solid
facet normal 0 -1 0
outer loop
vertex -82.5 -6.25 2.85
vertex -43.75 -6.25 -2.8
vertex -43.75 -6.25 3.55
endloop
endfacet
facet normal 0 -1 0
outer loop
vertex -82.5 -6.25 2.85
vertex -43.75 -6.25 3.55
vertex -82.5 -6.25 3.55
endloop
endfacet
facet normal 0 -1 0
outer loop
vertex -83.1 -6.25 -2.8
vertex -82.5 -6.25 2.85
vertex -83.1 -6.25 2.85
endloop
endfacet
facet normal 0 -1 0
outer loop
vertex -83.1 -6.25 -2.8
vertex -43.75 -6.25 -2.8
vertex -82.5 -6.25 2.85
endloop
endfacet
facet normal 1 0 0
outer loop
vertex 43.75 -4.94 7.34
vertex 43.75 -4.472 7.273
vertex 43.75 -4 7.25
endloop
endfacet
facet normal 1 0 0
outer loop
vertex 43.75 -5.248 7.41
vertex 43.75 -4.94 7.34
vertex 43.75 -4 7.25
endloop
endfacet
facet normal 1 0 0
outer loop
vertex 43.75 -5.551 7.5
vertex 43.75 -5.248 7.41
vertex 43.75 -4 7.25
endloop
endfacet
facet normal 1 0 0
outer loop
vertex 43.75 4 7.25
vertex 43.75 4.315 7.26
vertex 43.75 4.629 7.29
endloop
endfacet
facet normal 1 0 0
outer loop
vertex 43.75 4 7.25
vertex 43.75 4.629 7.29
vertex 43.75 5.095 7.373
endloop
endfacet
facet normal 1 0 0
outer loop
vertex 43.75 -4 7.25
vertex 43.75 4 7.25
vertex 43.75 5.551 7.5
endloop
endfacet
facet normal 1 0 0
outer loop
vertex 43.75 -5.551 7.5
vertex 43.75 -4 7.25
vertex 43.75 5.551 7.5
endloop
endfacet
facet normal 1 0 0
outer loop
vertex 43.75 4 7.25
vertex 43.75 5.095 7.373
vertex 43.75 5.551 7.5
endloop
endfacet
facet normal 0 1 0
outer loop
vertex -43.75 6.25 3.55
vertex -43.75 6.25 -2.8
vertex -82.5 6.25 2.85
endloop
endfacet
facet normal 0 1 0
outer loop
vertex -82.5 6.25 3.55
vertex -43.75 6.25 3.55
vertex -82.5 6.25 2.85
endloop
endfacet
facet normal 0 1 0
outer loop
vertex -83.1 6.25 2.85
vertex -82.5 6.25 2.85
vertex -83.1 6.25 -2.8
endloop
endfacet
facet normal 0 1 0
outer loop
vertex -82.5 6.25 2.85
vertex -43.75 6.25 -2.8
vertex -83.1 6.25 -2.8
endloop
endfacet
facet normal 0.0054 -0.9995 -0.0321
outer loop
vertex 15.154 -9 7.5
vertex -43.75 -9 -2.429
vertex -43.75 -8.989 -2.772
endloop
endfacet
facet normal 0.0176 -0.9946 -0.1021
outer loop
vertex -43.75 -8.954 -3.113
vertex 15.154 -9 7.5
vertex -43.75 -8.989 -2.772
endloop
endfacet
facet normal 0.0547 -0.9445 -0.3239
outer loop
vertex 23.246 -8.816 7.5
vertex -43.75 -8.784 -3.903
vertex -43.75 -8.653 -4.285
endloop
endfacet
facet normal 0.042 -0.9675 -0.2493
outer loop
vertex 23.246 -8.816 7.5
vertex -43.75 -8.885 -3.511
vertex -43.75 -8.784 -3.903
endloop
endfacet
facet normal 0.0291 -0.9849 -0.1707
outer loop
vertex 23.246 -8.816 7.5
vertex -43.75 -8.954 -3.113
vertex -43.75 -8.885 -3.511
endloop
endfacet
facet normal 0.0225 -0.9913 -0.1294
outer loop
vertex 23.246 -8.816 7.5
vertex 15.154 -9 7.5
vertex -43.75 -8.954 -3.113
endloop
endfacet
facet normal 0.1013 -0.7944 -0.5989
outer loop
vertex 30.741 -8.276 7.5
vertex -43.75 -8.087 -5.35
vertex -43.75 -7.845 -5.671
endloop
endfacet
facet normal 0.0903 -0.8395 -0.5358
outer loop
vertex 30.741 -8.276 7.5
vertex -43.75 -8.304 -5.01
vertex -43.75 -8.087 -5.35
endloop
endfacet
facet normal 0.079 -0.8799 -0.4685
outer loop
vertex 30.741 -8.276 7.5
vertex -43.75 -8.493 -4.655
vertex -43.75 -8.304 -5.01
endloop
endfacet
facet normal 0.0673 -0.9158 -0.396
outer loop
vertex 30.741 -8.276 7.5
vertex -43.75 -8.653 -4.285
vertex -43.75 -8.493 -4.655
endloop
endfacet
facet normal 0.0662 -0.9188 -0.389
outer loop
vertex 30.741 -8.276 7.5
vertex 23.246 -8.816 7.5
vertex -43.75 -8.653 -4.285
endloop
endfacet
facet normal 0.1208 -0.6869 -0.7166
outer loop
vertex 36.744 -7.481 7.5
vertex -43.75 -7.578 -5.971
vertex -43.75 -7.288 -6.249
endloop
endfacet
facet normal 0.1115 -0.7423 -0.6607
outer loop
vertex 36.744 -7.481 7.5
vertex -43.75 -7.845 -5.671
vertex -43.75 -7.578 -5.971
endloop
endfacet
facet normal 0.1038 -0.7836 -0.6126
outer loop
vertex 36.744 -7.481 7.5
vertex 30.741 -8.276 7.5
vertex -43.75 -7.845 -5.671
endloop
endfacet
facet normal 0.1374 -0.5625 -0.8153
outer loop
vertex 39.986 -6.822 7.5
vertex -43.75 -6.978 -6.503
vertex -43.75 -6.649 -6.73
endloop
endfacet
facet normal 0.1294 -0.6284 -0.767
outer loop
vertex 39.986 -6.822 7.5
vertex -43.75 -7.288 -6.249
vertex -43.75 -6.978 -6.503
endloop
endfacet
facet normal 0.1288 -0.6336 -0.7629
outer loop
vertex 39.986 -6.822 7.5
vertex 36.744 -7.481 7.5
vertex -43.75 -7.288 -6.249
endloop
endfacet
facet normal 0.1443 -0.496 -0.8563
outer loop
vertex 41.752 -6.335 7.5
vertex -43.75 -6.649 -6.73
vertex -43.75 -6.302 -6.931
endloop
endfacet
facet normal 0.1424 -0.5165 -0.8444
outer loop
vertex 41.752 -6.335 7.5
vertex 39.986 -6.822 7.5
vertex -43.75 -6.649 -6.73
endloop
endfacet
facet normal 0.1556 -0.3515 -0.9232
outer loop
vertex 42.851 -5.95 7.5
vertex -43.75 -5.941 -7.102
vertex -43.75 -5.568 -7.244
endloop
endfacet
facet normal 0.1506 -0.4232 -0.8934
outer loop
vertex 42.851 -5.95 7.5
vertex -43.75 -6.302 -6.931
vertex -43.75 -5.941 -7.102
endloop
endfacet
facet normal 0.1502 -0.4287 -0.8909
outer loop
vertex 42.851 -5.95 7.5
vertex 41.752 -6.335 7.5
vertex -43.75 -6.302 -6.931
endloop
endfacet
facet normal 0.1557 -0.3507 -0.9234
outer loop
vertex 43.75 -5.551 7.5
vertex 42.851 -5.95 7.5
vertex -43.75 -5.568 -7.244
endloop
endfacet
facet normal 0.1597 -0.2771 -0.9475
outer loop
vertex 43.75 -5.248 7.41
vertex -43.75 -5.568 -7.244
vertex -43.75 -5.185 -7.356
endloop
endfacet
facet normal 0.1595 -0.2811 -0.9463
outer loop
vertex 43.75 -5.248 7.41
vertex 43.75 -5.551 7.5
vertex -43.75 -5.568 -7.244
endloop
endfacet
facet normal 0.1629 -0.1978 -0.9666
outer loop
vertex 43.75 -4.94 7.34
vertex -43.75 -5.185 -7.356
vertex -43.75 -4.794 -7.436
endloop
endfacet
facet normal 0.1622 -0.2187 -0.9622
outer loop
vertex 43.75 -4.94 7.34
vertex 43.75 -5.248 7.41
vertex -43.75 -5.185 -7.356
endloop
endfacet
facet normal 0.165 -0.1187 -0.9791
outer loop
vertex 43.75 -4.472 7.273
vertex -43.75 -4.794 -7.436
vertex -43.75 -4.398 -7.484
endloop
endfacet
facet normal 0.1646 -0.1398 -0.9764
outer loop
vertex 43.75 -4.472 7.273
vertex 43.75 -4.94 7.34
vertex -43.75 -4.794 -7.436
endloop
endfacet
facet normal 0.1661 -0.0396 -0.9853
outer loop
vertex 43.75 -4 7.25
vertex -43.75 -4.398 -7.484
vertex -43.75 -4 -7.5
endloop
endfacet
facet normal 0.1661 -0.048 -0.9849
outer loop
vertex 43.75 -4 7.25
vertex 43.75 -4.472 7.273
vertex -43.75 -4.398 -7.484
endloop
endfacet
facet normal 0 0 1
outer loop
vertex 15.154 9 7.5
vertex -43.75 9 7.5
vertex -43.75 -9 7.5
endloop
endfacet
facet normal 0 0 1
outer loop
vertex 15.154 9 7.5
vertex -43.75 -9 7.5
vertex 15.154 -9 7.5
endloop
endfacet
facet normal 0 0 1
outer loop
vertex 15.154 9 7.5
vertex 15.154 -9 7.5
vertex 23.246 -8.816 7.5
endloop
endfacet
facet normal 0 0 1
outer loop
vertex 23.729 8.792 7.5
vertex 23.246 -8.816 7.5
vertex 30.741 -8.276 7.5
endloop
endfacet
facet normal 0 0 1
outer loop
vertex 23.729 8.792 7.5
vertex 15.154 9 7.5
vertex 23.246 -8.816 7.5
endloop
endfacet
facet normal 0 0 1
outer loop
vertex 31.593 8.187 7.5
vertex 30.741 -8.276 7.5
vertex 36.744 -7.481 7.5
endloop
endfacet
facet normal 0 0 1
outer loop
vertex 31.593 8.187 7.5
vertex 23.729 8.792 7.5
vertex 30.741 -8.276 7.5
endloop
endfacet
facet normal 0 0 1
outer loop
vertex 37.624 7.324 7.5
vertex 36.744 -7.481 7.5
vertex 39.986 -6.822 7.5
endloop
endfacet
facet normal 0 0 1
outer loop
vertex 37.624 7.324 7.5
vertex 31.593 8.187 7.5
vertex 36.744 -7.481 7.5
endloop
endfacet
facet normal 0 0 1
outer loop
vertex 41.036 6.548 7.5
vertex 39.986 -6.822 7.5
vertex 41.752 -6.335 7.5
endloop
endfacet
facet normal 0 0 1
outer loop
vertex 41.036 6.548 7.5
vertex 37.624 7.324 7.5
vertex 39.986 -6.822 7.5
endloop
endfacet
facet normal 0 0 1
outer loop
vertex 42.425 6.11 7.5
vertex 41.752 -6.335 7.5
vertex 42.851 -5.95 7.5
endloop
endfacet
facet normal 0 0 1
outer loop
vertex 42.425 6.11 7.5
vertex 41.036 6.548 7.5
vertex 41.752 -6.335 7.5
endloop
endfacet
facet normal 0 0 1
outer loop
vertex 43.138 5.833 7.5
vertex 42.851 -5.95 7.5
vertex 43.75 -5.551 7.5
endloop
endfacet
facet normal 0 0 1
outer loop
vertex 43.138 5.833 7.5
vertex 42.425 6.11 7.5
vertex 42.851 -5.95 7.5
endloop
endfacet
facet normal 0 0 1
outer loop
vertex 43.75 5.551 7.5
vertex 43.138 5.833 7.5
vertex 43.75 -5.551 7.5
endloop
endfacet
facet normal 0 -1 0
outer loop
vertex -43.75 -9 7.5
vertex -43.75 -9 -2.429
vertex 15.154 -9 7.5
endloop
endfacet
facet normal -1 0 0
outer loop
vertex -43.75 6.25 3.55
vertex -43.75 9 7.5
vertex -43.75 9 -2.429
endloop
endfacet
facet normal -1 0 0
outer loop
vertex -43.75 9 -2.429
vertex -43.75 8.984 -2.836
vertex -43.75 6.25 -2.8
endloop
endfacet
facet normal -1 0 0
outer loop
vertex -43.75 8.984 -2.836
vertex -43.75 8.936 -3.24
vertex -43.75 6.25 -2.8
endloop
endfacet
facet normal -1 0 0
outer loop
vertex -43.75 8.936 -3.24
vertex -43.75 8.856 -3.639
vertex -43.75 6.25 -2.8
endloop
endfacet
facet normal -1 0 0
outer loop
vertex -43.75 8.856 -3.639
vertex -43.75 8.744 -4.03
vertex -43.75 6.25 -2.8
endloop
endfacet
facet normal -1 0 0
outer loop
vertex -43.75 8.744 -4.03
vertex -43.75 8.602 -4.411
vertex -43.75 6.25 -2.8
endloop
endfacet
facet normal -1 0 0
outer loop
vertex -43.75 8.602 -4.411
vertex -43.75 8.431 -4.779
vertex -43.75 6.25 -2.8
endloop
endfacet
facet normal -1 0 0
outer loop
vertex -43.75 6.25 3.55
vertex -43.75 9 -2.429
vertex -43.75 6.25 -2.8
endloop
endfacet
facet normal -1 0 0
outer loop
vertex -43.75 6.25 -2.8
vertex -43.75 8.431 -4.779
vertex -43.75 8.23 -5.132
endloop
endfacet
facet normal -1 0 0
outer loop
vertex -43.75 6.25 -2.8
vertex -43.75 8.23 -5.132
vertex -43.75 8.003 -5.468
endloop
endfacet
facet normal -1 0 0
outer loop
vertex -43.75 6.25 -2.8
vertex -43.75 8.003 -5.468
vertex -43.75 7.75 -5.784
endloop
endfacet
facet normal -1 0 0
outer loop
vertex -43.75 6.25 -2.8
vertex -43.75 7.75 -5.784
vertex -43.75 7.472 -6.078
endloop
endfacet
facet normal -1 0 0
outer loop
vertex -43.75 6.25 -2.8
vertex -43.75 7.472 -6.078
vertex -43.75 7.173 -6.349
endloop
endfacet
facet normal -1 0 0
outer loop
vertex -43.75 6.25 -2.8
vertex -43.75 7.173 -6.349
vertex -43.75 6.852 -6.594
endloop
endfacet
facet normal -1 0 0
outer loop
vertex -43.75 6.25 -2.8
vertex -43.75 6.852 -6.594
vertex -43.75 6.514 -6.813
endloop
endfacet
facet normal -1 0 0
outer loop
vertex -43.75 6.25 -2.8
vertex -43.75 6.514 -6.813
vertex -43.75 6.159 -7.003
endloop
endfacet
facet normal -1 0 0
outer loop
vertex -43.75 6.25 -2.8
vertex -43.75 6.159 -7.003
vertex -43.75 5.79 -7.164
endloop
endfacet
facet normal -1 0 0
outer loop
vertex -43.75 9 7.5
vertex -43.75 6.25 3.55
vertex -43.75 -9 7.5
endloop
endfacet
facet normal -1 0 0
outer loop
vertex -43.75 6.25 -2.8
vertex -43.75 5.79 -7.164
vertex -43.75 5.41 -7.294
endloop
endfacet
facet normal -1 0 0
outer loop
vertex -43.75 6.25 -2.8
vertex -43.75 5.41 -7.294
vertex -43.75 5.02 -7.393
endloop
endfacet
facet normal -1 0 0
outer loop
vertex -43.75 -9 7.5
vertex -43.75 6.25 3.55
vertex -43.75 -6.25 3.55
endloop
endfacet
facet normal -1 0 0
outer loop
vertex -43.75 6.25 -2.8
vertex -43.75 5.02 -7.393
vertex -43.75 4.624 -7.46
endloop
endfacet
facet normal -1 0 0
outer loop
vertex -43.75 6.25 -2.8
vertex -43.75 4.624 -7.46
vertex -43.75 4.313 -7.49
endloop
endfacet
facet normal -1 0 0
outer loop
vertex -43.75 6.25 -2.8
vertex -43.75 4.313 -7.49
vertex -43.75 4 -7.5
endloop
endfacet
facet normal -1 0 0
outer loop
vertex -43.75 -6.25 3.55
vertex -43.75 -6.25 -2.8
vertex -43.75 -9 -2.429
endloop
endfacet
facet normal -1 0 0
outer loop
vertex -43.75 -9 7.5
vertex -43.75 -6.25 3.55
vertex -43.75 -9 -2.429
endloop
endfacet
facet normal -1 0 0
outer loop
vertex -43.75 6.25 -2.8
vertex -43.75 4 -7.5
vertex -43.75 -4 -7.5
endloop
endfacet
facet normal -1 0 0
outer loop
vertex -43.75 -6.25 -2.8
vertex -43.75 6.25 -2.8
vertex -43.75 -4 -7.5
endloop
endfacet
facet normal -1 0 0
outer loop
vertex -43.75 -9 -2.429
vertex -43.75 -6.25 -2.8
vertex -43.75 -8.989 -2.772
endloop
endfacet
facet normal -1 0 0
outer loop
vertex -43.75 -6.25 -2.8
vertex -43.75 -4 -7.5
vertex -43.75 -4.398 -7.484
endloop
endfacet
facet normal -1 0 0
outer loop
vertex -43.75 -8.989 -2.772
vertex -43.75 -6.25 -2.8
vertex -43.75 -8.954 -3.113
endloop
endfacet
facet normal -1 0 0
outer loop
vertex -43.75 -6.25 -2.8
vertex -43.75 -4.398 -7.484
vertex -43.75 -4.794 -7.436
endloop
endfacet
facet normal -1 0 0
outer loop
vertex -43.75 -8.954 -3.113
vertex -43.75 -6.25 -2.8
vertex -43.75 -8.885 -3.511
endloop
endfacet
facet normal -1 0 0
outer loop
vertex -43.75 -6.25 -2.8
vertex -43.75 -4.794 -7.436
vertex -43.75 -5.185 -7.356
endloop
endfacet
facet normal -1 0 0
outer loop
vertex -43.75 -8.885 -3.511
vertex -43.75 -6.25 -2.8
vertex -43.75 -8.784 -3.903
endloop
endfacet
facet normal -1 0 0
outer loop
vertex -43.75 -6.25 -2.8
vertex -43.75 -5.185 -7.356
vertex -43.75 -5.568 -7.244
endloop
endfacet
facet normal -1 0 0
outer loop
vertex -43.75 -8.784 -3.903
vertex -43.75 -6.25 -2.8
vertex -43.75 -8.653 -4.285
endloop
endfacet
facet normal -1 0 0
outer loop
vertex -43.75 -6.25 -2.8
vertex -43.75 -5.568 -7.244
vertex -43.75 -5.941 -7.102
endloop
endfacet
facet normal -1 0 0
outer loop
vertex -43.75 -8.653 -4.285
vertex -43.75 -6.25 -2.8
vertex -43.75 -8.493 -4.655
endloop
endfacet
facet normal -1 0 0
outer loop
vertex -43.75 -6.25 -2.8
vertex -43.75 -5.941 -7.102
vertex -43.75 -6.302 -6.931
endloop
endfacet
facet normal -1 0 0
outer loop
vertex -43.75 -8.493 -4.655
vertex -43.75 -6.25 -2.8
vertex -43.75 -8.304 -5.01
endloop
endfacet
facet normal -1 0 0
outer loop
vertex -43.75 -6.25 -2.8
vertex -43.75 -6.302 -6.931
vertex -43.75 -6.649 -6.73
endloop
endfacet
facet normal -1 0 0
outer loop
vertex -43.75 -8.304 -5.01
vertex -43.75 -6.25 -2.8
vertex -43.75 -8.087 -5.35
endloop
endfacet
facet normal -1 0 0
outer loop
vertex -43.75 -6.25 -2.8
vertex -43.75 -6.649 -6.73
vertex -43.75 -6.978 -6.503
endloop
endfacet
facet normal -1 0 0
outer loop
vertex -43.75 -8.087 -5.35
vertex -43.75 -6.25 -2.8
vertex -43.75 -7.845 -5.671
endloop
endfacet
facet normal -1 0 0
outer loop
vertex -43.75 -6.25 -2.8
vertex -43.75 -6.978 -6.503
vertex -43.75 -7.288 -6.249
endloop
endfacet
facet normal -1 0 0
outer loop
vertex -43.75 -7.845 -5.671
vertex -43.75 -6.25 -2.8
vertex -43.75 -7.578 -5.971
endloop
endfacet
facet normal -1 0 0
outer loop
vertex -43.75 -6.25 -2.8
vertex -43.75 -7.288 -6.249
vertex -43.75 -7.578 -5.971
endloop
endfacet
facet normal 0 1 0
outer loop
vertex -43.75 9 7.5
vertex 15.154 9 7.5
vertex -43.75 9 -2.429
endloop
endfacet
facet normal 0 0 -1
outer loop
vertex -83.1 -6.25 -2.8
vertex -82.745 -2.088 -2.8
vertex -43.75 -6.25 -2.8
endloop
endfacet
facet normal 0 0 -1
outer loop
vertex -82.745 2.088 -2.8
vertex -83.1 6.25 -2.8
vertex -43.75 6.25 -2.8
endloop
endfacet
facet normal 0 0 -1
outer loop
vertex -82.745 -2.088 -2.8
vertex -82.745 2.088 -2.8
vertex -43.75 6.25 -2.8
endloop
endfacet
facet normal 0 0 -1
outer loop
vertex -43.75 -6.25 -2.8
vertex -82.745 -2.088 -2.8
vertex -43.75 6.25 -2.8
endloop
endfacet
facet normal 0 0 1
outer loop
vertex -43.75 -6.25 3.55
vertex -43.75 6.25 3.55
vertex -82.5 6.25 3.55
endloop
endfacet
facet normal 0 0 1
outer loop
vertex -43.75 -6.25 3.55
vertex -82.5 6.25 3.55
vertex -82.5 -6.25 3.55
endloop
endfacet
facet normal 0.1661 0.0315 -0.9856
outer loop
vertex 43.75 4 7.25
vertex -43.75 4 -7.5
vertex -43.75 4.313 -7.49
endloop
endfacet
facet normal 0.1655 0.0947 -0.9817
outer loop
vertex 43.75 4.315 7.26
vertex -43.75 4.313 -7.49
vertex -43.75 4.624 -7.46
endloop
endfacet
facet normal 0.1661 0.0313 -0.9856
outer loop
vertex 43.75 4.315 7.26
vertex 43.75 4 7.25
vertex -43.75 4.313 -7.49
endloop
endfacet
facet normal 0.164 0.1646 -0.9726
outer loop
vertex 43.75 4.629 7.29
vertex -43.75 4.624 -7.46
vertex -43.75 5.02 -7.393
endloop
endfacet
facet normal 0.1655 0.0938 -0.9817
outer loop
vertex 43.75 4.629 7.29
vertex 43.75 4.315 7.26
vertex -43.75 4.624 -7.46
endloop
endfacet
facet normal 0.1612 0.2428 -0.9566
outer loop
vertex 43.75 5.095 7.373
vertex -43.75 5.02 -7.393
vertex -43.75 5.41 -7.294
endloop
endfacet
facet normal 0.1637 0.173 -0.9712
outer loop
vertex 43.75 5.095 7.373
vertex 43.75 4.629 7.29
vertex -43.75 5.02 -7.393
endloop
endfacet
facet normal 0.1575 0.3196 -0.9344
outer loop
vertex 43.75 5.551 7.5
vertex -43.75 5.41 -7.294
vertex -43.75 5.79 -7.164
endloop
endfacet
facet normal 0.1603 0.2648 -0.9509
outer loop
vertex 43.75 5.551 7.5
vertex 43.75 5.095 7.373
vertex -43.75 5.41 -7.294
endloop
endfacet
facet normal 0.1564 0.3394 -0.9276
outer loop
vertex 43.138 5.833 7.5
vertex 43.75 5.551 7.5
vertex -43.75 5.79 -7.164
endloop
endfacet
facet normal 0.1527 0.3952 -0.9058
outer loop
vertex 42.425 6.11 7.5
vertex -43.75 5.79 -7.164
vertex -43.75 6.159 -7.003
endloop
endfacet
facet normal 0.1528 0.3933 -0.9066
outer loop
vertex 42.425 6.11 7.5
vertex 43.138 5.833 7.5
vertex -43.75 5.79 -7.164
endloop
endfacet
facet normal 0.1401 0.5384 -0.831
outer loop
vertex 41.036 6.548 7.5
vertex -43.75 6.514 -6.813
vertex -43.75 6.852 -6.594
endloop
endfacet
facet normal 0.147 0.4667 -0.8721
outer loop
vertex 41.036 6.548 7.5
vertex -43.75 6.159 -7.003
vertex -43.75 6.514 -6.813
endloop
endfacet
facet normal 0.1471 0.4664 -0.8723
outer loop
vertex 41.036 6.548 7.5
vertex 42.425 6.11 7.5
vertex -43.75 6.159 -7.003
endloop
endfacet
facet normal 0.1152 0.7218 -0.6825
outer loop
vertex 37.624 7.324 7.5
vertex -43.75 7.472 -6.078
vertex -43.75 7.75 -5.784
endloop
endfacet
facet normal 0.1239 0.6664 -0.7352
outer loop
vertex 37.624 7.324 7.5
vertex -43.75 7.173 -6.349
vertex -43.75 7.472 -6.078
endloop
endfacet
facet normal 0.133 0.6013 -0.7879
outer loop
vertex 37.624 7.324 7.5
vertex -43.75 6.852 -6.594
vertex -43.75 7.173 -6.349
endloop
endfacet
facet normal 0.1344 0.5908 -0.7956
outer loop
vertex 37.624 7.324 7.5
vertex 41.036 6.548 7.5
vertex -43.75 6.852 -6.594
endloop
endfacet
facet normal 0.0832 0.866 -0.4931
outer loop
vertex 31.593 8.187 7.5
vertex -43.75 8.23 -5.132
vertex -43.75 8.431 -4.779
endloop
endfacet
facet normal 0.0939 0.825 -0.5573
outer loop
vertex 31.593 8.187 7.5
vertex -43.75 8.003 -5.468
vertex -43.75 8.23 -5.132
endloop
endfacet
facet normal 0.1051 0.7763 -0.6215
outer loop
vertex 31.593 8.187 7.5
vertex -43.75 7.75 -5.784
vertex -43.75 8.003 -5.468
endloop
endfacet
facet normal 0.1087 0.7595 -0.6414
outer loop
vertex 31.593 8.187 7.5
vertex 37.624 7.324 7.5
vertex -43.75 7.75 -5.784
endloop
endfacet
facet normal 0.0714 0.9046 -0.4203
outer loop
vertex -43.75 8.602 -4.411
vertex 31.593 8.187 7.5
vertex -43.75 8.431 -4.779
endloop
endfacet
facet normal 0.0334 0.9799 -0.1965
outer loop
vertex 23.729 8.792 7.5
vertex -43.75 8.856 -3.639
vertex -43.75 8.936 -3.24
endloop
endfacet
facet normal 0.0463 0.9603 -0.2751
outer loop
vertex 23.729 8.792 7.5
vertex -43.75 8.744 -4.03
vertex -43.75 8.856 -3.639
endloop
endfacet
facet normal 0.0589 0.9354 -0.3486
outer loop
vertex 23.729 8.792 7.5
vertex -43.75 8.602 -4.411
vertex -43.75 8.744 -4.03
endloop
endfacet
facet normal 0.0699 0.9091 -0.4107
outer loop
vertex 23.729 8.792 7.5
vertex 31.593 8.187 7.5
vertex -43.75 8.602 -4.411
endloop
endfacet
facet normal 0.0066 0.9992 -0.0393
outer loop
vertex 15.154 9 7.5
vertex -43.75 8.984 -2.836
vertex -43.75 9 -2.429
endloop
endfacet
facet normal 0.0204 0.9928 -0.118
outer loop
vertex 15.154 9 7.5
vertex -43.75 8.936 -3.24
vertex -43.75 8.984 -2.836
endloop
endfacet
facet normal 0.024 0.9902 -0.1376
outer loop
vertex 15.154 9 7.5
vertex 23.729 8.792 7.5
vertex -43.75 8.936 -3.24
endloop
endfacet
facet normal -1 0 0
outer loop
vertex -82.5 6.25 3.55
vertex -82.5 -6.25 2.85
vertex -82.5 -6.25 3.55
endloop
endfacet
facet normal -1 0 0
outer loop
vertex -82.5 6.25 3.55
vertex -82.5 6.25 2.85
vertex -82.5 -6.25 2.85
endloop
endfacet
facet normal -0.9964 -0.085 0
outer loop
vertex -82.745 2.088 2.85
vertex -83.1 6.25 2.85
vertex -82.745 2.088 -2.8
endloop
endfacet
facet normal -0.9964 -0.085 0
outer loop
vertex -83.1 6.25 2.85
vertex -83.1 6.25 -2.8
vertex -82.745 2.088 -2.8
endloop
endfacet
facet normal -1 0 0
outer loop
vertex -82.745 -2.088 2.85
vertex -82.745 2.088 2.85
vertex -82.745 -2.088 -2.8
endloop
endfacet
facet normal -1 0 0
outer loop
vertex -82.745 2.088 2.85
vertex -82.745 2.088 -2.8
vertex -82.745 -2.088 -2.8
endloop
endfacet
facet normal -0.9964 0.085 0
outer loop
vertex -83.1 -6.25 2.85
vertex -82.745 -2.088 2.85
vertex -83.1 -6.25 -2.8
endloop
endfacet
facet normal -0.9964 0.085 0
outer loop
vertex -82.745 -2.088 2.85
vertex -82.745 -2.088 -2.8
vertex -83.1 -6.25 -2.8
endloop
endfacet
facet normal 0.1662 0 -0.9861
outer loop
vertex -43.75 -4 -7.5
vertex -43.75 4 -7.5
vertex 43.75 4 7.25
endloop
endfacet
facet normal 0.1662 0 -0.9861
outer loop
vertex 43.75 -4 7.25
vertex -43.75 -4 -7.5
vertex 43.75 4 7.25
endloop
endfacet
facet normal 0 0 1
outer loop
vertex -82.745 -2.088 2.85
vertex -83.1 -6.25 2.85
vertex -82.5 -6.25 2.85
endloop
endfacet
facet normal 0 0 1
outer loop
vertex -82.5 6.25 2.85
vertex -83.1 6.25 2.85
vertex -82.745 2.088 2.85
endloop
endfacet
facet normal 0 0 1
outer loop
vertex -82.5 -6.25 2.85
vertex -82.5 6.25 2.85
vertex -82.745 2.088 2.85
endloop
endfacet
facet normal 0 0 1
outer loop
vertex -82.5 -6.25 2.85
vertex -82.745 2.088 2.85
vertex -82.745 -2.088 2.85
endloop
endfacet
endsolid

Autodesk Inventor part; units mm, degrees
sketch "Sketch1" plane through (0, 0, 0) normal (0, 0, 1) x (1, 0, 0)
  line L0 (-43.75, -9) -> (43.75, -9)
  line L1 (43.75, -9) -> (43.75, 9)
  line L2 (43.75, 9) -> (-43.75, 9)
  line L3 (-43.75, 9) -> (-43.75, -9)
  line L4 (-43.75, -9) -> (43.75, 9) construction
  line L5 (43.75, -9) -> (-43.75, 9) construction
  point P0 (0, 0)
  dimension "d0" = 87.5
  dimension "d1" = 18
extrude "Extrusion1" add sketch "Sketch1" along normal mid plane 15
sketch "Sketch3" plane through (-43.75, 9, 7.5) normal (0, 1, 0) x (1, 0, 0)
  line L0 (0, 15) -> (87.5, 0.25)
  line L1 (87.5, 15) -> (87.5, 0) construction
  line L2 (87.5, 0.25) -> (87.5, 15)
  line L3 (87.5, 15) -> (0, 15)
  point P0 (43.75, 7.5)
  point P1 (87.5, 7.625)
  dimension "d5" = 0.25
extrude "Extrusion2" cut sketch "Sketch3" along normal through all both and the other way through all
sketch "Sketch5" plane through (-43.75, -9, 7.5) normal (-1, 0, 0) x (0, 0, 1)
  line L0 (-3.95, 2.75) -> (-10.3, 2.75)
  line L1 (-10.3, 2.75) -> (-10.3, 15.25)
  line L2 (-10.3, 15.25) -> (-3.95, 15.25)
  line L3 (-3.95, 15.25) -> (-3.95, 2.75)
  line L4 (-3.95, 2.75) -> (-10.3, 15.25) construction
  line L5 (-10.3, 2.75) -> (-3.95, 15.25) construction
  line L6 (0, 18) -> (0, 0) construction
  line L7 (-15, 0) -> (-15, 18) construction
  point P0 (-7.5, 9)
  point P1 (-7.125, 9)
  dimension "d14" = 12.5
  dimension "d28" = 3.95
  dimension "d29" = 4.7
extrude "Extrusion4" add sketch "Sketch5" along normal blind 38.75
sketch "Sketch7" plane through (0, 0, -2.8) normal (0, 0, 1) x (1, 0, 0)
  line L0 (-82.5, 6.25) -> (-82.5, -6.25) construction
  circle A0 centre (-131.7, 0) radius 49
  line L1 (43.75, -9) -> (43.75, 9) projected
  line L2 (-82.5, -6.25) -> (-83.1002, -6.25)
  line L3 (-82.5, 6.25) -> (-83.1002, 6.25)
  line L4 (-82.5, -6.25) -> (-82.5, 6.25)
  point P0 (0, 0)
  point P1 (43.75, 0)
  point P2 (-82.5, 0)
  dimension "d23" = 98
  dimension "d24" = 175.45
extrude "Extrusion5" add sketch "Sketch7" along normal blind 5.65 contours A0 L3 L4 L2
fillet "Fillet2" radius 5 2 edges at (0, 9, -0.125) (0, -9, -0.125)
equation "\"d25\" = d15"
equation "\"d15\" = 5.65"
properties part number "BracoRobotico_0003_002" material "Rubber"
